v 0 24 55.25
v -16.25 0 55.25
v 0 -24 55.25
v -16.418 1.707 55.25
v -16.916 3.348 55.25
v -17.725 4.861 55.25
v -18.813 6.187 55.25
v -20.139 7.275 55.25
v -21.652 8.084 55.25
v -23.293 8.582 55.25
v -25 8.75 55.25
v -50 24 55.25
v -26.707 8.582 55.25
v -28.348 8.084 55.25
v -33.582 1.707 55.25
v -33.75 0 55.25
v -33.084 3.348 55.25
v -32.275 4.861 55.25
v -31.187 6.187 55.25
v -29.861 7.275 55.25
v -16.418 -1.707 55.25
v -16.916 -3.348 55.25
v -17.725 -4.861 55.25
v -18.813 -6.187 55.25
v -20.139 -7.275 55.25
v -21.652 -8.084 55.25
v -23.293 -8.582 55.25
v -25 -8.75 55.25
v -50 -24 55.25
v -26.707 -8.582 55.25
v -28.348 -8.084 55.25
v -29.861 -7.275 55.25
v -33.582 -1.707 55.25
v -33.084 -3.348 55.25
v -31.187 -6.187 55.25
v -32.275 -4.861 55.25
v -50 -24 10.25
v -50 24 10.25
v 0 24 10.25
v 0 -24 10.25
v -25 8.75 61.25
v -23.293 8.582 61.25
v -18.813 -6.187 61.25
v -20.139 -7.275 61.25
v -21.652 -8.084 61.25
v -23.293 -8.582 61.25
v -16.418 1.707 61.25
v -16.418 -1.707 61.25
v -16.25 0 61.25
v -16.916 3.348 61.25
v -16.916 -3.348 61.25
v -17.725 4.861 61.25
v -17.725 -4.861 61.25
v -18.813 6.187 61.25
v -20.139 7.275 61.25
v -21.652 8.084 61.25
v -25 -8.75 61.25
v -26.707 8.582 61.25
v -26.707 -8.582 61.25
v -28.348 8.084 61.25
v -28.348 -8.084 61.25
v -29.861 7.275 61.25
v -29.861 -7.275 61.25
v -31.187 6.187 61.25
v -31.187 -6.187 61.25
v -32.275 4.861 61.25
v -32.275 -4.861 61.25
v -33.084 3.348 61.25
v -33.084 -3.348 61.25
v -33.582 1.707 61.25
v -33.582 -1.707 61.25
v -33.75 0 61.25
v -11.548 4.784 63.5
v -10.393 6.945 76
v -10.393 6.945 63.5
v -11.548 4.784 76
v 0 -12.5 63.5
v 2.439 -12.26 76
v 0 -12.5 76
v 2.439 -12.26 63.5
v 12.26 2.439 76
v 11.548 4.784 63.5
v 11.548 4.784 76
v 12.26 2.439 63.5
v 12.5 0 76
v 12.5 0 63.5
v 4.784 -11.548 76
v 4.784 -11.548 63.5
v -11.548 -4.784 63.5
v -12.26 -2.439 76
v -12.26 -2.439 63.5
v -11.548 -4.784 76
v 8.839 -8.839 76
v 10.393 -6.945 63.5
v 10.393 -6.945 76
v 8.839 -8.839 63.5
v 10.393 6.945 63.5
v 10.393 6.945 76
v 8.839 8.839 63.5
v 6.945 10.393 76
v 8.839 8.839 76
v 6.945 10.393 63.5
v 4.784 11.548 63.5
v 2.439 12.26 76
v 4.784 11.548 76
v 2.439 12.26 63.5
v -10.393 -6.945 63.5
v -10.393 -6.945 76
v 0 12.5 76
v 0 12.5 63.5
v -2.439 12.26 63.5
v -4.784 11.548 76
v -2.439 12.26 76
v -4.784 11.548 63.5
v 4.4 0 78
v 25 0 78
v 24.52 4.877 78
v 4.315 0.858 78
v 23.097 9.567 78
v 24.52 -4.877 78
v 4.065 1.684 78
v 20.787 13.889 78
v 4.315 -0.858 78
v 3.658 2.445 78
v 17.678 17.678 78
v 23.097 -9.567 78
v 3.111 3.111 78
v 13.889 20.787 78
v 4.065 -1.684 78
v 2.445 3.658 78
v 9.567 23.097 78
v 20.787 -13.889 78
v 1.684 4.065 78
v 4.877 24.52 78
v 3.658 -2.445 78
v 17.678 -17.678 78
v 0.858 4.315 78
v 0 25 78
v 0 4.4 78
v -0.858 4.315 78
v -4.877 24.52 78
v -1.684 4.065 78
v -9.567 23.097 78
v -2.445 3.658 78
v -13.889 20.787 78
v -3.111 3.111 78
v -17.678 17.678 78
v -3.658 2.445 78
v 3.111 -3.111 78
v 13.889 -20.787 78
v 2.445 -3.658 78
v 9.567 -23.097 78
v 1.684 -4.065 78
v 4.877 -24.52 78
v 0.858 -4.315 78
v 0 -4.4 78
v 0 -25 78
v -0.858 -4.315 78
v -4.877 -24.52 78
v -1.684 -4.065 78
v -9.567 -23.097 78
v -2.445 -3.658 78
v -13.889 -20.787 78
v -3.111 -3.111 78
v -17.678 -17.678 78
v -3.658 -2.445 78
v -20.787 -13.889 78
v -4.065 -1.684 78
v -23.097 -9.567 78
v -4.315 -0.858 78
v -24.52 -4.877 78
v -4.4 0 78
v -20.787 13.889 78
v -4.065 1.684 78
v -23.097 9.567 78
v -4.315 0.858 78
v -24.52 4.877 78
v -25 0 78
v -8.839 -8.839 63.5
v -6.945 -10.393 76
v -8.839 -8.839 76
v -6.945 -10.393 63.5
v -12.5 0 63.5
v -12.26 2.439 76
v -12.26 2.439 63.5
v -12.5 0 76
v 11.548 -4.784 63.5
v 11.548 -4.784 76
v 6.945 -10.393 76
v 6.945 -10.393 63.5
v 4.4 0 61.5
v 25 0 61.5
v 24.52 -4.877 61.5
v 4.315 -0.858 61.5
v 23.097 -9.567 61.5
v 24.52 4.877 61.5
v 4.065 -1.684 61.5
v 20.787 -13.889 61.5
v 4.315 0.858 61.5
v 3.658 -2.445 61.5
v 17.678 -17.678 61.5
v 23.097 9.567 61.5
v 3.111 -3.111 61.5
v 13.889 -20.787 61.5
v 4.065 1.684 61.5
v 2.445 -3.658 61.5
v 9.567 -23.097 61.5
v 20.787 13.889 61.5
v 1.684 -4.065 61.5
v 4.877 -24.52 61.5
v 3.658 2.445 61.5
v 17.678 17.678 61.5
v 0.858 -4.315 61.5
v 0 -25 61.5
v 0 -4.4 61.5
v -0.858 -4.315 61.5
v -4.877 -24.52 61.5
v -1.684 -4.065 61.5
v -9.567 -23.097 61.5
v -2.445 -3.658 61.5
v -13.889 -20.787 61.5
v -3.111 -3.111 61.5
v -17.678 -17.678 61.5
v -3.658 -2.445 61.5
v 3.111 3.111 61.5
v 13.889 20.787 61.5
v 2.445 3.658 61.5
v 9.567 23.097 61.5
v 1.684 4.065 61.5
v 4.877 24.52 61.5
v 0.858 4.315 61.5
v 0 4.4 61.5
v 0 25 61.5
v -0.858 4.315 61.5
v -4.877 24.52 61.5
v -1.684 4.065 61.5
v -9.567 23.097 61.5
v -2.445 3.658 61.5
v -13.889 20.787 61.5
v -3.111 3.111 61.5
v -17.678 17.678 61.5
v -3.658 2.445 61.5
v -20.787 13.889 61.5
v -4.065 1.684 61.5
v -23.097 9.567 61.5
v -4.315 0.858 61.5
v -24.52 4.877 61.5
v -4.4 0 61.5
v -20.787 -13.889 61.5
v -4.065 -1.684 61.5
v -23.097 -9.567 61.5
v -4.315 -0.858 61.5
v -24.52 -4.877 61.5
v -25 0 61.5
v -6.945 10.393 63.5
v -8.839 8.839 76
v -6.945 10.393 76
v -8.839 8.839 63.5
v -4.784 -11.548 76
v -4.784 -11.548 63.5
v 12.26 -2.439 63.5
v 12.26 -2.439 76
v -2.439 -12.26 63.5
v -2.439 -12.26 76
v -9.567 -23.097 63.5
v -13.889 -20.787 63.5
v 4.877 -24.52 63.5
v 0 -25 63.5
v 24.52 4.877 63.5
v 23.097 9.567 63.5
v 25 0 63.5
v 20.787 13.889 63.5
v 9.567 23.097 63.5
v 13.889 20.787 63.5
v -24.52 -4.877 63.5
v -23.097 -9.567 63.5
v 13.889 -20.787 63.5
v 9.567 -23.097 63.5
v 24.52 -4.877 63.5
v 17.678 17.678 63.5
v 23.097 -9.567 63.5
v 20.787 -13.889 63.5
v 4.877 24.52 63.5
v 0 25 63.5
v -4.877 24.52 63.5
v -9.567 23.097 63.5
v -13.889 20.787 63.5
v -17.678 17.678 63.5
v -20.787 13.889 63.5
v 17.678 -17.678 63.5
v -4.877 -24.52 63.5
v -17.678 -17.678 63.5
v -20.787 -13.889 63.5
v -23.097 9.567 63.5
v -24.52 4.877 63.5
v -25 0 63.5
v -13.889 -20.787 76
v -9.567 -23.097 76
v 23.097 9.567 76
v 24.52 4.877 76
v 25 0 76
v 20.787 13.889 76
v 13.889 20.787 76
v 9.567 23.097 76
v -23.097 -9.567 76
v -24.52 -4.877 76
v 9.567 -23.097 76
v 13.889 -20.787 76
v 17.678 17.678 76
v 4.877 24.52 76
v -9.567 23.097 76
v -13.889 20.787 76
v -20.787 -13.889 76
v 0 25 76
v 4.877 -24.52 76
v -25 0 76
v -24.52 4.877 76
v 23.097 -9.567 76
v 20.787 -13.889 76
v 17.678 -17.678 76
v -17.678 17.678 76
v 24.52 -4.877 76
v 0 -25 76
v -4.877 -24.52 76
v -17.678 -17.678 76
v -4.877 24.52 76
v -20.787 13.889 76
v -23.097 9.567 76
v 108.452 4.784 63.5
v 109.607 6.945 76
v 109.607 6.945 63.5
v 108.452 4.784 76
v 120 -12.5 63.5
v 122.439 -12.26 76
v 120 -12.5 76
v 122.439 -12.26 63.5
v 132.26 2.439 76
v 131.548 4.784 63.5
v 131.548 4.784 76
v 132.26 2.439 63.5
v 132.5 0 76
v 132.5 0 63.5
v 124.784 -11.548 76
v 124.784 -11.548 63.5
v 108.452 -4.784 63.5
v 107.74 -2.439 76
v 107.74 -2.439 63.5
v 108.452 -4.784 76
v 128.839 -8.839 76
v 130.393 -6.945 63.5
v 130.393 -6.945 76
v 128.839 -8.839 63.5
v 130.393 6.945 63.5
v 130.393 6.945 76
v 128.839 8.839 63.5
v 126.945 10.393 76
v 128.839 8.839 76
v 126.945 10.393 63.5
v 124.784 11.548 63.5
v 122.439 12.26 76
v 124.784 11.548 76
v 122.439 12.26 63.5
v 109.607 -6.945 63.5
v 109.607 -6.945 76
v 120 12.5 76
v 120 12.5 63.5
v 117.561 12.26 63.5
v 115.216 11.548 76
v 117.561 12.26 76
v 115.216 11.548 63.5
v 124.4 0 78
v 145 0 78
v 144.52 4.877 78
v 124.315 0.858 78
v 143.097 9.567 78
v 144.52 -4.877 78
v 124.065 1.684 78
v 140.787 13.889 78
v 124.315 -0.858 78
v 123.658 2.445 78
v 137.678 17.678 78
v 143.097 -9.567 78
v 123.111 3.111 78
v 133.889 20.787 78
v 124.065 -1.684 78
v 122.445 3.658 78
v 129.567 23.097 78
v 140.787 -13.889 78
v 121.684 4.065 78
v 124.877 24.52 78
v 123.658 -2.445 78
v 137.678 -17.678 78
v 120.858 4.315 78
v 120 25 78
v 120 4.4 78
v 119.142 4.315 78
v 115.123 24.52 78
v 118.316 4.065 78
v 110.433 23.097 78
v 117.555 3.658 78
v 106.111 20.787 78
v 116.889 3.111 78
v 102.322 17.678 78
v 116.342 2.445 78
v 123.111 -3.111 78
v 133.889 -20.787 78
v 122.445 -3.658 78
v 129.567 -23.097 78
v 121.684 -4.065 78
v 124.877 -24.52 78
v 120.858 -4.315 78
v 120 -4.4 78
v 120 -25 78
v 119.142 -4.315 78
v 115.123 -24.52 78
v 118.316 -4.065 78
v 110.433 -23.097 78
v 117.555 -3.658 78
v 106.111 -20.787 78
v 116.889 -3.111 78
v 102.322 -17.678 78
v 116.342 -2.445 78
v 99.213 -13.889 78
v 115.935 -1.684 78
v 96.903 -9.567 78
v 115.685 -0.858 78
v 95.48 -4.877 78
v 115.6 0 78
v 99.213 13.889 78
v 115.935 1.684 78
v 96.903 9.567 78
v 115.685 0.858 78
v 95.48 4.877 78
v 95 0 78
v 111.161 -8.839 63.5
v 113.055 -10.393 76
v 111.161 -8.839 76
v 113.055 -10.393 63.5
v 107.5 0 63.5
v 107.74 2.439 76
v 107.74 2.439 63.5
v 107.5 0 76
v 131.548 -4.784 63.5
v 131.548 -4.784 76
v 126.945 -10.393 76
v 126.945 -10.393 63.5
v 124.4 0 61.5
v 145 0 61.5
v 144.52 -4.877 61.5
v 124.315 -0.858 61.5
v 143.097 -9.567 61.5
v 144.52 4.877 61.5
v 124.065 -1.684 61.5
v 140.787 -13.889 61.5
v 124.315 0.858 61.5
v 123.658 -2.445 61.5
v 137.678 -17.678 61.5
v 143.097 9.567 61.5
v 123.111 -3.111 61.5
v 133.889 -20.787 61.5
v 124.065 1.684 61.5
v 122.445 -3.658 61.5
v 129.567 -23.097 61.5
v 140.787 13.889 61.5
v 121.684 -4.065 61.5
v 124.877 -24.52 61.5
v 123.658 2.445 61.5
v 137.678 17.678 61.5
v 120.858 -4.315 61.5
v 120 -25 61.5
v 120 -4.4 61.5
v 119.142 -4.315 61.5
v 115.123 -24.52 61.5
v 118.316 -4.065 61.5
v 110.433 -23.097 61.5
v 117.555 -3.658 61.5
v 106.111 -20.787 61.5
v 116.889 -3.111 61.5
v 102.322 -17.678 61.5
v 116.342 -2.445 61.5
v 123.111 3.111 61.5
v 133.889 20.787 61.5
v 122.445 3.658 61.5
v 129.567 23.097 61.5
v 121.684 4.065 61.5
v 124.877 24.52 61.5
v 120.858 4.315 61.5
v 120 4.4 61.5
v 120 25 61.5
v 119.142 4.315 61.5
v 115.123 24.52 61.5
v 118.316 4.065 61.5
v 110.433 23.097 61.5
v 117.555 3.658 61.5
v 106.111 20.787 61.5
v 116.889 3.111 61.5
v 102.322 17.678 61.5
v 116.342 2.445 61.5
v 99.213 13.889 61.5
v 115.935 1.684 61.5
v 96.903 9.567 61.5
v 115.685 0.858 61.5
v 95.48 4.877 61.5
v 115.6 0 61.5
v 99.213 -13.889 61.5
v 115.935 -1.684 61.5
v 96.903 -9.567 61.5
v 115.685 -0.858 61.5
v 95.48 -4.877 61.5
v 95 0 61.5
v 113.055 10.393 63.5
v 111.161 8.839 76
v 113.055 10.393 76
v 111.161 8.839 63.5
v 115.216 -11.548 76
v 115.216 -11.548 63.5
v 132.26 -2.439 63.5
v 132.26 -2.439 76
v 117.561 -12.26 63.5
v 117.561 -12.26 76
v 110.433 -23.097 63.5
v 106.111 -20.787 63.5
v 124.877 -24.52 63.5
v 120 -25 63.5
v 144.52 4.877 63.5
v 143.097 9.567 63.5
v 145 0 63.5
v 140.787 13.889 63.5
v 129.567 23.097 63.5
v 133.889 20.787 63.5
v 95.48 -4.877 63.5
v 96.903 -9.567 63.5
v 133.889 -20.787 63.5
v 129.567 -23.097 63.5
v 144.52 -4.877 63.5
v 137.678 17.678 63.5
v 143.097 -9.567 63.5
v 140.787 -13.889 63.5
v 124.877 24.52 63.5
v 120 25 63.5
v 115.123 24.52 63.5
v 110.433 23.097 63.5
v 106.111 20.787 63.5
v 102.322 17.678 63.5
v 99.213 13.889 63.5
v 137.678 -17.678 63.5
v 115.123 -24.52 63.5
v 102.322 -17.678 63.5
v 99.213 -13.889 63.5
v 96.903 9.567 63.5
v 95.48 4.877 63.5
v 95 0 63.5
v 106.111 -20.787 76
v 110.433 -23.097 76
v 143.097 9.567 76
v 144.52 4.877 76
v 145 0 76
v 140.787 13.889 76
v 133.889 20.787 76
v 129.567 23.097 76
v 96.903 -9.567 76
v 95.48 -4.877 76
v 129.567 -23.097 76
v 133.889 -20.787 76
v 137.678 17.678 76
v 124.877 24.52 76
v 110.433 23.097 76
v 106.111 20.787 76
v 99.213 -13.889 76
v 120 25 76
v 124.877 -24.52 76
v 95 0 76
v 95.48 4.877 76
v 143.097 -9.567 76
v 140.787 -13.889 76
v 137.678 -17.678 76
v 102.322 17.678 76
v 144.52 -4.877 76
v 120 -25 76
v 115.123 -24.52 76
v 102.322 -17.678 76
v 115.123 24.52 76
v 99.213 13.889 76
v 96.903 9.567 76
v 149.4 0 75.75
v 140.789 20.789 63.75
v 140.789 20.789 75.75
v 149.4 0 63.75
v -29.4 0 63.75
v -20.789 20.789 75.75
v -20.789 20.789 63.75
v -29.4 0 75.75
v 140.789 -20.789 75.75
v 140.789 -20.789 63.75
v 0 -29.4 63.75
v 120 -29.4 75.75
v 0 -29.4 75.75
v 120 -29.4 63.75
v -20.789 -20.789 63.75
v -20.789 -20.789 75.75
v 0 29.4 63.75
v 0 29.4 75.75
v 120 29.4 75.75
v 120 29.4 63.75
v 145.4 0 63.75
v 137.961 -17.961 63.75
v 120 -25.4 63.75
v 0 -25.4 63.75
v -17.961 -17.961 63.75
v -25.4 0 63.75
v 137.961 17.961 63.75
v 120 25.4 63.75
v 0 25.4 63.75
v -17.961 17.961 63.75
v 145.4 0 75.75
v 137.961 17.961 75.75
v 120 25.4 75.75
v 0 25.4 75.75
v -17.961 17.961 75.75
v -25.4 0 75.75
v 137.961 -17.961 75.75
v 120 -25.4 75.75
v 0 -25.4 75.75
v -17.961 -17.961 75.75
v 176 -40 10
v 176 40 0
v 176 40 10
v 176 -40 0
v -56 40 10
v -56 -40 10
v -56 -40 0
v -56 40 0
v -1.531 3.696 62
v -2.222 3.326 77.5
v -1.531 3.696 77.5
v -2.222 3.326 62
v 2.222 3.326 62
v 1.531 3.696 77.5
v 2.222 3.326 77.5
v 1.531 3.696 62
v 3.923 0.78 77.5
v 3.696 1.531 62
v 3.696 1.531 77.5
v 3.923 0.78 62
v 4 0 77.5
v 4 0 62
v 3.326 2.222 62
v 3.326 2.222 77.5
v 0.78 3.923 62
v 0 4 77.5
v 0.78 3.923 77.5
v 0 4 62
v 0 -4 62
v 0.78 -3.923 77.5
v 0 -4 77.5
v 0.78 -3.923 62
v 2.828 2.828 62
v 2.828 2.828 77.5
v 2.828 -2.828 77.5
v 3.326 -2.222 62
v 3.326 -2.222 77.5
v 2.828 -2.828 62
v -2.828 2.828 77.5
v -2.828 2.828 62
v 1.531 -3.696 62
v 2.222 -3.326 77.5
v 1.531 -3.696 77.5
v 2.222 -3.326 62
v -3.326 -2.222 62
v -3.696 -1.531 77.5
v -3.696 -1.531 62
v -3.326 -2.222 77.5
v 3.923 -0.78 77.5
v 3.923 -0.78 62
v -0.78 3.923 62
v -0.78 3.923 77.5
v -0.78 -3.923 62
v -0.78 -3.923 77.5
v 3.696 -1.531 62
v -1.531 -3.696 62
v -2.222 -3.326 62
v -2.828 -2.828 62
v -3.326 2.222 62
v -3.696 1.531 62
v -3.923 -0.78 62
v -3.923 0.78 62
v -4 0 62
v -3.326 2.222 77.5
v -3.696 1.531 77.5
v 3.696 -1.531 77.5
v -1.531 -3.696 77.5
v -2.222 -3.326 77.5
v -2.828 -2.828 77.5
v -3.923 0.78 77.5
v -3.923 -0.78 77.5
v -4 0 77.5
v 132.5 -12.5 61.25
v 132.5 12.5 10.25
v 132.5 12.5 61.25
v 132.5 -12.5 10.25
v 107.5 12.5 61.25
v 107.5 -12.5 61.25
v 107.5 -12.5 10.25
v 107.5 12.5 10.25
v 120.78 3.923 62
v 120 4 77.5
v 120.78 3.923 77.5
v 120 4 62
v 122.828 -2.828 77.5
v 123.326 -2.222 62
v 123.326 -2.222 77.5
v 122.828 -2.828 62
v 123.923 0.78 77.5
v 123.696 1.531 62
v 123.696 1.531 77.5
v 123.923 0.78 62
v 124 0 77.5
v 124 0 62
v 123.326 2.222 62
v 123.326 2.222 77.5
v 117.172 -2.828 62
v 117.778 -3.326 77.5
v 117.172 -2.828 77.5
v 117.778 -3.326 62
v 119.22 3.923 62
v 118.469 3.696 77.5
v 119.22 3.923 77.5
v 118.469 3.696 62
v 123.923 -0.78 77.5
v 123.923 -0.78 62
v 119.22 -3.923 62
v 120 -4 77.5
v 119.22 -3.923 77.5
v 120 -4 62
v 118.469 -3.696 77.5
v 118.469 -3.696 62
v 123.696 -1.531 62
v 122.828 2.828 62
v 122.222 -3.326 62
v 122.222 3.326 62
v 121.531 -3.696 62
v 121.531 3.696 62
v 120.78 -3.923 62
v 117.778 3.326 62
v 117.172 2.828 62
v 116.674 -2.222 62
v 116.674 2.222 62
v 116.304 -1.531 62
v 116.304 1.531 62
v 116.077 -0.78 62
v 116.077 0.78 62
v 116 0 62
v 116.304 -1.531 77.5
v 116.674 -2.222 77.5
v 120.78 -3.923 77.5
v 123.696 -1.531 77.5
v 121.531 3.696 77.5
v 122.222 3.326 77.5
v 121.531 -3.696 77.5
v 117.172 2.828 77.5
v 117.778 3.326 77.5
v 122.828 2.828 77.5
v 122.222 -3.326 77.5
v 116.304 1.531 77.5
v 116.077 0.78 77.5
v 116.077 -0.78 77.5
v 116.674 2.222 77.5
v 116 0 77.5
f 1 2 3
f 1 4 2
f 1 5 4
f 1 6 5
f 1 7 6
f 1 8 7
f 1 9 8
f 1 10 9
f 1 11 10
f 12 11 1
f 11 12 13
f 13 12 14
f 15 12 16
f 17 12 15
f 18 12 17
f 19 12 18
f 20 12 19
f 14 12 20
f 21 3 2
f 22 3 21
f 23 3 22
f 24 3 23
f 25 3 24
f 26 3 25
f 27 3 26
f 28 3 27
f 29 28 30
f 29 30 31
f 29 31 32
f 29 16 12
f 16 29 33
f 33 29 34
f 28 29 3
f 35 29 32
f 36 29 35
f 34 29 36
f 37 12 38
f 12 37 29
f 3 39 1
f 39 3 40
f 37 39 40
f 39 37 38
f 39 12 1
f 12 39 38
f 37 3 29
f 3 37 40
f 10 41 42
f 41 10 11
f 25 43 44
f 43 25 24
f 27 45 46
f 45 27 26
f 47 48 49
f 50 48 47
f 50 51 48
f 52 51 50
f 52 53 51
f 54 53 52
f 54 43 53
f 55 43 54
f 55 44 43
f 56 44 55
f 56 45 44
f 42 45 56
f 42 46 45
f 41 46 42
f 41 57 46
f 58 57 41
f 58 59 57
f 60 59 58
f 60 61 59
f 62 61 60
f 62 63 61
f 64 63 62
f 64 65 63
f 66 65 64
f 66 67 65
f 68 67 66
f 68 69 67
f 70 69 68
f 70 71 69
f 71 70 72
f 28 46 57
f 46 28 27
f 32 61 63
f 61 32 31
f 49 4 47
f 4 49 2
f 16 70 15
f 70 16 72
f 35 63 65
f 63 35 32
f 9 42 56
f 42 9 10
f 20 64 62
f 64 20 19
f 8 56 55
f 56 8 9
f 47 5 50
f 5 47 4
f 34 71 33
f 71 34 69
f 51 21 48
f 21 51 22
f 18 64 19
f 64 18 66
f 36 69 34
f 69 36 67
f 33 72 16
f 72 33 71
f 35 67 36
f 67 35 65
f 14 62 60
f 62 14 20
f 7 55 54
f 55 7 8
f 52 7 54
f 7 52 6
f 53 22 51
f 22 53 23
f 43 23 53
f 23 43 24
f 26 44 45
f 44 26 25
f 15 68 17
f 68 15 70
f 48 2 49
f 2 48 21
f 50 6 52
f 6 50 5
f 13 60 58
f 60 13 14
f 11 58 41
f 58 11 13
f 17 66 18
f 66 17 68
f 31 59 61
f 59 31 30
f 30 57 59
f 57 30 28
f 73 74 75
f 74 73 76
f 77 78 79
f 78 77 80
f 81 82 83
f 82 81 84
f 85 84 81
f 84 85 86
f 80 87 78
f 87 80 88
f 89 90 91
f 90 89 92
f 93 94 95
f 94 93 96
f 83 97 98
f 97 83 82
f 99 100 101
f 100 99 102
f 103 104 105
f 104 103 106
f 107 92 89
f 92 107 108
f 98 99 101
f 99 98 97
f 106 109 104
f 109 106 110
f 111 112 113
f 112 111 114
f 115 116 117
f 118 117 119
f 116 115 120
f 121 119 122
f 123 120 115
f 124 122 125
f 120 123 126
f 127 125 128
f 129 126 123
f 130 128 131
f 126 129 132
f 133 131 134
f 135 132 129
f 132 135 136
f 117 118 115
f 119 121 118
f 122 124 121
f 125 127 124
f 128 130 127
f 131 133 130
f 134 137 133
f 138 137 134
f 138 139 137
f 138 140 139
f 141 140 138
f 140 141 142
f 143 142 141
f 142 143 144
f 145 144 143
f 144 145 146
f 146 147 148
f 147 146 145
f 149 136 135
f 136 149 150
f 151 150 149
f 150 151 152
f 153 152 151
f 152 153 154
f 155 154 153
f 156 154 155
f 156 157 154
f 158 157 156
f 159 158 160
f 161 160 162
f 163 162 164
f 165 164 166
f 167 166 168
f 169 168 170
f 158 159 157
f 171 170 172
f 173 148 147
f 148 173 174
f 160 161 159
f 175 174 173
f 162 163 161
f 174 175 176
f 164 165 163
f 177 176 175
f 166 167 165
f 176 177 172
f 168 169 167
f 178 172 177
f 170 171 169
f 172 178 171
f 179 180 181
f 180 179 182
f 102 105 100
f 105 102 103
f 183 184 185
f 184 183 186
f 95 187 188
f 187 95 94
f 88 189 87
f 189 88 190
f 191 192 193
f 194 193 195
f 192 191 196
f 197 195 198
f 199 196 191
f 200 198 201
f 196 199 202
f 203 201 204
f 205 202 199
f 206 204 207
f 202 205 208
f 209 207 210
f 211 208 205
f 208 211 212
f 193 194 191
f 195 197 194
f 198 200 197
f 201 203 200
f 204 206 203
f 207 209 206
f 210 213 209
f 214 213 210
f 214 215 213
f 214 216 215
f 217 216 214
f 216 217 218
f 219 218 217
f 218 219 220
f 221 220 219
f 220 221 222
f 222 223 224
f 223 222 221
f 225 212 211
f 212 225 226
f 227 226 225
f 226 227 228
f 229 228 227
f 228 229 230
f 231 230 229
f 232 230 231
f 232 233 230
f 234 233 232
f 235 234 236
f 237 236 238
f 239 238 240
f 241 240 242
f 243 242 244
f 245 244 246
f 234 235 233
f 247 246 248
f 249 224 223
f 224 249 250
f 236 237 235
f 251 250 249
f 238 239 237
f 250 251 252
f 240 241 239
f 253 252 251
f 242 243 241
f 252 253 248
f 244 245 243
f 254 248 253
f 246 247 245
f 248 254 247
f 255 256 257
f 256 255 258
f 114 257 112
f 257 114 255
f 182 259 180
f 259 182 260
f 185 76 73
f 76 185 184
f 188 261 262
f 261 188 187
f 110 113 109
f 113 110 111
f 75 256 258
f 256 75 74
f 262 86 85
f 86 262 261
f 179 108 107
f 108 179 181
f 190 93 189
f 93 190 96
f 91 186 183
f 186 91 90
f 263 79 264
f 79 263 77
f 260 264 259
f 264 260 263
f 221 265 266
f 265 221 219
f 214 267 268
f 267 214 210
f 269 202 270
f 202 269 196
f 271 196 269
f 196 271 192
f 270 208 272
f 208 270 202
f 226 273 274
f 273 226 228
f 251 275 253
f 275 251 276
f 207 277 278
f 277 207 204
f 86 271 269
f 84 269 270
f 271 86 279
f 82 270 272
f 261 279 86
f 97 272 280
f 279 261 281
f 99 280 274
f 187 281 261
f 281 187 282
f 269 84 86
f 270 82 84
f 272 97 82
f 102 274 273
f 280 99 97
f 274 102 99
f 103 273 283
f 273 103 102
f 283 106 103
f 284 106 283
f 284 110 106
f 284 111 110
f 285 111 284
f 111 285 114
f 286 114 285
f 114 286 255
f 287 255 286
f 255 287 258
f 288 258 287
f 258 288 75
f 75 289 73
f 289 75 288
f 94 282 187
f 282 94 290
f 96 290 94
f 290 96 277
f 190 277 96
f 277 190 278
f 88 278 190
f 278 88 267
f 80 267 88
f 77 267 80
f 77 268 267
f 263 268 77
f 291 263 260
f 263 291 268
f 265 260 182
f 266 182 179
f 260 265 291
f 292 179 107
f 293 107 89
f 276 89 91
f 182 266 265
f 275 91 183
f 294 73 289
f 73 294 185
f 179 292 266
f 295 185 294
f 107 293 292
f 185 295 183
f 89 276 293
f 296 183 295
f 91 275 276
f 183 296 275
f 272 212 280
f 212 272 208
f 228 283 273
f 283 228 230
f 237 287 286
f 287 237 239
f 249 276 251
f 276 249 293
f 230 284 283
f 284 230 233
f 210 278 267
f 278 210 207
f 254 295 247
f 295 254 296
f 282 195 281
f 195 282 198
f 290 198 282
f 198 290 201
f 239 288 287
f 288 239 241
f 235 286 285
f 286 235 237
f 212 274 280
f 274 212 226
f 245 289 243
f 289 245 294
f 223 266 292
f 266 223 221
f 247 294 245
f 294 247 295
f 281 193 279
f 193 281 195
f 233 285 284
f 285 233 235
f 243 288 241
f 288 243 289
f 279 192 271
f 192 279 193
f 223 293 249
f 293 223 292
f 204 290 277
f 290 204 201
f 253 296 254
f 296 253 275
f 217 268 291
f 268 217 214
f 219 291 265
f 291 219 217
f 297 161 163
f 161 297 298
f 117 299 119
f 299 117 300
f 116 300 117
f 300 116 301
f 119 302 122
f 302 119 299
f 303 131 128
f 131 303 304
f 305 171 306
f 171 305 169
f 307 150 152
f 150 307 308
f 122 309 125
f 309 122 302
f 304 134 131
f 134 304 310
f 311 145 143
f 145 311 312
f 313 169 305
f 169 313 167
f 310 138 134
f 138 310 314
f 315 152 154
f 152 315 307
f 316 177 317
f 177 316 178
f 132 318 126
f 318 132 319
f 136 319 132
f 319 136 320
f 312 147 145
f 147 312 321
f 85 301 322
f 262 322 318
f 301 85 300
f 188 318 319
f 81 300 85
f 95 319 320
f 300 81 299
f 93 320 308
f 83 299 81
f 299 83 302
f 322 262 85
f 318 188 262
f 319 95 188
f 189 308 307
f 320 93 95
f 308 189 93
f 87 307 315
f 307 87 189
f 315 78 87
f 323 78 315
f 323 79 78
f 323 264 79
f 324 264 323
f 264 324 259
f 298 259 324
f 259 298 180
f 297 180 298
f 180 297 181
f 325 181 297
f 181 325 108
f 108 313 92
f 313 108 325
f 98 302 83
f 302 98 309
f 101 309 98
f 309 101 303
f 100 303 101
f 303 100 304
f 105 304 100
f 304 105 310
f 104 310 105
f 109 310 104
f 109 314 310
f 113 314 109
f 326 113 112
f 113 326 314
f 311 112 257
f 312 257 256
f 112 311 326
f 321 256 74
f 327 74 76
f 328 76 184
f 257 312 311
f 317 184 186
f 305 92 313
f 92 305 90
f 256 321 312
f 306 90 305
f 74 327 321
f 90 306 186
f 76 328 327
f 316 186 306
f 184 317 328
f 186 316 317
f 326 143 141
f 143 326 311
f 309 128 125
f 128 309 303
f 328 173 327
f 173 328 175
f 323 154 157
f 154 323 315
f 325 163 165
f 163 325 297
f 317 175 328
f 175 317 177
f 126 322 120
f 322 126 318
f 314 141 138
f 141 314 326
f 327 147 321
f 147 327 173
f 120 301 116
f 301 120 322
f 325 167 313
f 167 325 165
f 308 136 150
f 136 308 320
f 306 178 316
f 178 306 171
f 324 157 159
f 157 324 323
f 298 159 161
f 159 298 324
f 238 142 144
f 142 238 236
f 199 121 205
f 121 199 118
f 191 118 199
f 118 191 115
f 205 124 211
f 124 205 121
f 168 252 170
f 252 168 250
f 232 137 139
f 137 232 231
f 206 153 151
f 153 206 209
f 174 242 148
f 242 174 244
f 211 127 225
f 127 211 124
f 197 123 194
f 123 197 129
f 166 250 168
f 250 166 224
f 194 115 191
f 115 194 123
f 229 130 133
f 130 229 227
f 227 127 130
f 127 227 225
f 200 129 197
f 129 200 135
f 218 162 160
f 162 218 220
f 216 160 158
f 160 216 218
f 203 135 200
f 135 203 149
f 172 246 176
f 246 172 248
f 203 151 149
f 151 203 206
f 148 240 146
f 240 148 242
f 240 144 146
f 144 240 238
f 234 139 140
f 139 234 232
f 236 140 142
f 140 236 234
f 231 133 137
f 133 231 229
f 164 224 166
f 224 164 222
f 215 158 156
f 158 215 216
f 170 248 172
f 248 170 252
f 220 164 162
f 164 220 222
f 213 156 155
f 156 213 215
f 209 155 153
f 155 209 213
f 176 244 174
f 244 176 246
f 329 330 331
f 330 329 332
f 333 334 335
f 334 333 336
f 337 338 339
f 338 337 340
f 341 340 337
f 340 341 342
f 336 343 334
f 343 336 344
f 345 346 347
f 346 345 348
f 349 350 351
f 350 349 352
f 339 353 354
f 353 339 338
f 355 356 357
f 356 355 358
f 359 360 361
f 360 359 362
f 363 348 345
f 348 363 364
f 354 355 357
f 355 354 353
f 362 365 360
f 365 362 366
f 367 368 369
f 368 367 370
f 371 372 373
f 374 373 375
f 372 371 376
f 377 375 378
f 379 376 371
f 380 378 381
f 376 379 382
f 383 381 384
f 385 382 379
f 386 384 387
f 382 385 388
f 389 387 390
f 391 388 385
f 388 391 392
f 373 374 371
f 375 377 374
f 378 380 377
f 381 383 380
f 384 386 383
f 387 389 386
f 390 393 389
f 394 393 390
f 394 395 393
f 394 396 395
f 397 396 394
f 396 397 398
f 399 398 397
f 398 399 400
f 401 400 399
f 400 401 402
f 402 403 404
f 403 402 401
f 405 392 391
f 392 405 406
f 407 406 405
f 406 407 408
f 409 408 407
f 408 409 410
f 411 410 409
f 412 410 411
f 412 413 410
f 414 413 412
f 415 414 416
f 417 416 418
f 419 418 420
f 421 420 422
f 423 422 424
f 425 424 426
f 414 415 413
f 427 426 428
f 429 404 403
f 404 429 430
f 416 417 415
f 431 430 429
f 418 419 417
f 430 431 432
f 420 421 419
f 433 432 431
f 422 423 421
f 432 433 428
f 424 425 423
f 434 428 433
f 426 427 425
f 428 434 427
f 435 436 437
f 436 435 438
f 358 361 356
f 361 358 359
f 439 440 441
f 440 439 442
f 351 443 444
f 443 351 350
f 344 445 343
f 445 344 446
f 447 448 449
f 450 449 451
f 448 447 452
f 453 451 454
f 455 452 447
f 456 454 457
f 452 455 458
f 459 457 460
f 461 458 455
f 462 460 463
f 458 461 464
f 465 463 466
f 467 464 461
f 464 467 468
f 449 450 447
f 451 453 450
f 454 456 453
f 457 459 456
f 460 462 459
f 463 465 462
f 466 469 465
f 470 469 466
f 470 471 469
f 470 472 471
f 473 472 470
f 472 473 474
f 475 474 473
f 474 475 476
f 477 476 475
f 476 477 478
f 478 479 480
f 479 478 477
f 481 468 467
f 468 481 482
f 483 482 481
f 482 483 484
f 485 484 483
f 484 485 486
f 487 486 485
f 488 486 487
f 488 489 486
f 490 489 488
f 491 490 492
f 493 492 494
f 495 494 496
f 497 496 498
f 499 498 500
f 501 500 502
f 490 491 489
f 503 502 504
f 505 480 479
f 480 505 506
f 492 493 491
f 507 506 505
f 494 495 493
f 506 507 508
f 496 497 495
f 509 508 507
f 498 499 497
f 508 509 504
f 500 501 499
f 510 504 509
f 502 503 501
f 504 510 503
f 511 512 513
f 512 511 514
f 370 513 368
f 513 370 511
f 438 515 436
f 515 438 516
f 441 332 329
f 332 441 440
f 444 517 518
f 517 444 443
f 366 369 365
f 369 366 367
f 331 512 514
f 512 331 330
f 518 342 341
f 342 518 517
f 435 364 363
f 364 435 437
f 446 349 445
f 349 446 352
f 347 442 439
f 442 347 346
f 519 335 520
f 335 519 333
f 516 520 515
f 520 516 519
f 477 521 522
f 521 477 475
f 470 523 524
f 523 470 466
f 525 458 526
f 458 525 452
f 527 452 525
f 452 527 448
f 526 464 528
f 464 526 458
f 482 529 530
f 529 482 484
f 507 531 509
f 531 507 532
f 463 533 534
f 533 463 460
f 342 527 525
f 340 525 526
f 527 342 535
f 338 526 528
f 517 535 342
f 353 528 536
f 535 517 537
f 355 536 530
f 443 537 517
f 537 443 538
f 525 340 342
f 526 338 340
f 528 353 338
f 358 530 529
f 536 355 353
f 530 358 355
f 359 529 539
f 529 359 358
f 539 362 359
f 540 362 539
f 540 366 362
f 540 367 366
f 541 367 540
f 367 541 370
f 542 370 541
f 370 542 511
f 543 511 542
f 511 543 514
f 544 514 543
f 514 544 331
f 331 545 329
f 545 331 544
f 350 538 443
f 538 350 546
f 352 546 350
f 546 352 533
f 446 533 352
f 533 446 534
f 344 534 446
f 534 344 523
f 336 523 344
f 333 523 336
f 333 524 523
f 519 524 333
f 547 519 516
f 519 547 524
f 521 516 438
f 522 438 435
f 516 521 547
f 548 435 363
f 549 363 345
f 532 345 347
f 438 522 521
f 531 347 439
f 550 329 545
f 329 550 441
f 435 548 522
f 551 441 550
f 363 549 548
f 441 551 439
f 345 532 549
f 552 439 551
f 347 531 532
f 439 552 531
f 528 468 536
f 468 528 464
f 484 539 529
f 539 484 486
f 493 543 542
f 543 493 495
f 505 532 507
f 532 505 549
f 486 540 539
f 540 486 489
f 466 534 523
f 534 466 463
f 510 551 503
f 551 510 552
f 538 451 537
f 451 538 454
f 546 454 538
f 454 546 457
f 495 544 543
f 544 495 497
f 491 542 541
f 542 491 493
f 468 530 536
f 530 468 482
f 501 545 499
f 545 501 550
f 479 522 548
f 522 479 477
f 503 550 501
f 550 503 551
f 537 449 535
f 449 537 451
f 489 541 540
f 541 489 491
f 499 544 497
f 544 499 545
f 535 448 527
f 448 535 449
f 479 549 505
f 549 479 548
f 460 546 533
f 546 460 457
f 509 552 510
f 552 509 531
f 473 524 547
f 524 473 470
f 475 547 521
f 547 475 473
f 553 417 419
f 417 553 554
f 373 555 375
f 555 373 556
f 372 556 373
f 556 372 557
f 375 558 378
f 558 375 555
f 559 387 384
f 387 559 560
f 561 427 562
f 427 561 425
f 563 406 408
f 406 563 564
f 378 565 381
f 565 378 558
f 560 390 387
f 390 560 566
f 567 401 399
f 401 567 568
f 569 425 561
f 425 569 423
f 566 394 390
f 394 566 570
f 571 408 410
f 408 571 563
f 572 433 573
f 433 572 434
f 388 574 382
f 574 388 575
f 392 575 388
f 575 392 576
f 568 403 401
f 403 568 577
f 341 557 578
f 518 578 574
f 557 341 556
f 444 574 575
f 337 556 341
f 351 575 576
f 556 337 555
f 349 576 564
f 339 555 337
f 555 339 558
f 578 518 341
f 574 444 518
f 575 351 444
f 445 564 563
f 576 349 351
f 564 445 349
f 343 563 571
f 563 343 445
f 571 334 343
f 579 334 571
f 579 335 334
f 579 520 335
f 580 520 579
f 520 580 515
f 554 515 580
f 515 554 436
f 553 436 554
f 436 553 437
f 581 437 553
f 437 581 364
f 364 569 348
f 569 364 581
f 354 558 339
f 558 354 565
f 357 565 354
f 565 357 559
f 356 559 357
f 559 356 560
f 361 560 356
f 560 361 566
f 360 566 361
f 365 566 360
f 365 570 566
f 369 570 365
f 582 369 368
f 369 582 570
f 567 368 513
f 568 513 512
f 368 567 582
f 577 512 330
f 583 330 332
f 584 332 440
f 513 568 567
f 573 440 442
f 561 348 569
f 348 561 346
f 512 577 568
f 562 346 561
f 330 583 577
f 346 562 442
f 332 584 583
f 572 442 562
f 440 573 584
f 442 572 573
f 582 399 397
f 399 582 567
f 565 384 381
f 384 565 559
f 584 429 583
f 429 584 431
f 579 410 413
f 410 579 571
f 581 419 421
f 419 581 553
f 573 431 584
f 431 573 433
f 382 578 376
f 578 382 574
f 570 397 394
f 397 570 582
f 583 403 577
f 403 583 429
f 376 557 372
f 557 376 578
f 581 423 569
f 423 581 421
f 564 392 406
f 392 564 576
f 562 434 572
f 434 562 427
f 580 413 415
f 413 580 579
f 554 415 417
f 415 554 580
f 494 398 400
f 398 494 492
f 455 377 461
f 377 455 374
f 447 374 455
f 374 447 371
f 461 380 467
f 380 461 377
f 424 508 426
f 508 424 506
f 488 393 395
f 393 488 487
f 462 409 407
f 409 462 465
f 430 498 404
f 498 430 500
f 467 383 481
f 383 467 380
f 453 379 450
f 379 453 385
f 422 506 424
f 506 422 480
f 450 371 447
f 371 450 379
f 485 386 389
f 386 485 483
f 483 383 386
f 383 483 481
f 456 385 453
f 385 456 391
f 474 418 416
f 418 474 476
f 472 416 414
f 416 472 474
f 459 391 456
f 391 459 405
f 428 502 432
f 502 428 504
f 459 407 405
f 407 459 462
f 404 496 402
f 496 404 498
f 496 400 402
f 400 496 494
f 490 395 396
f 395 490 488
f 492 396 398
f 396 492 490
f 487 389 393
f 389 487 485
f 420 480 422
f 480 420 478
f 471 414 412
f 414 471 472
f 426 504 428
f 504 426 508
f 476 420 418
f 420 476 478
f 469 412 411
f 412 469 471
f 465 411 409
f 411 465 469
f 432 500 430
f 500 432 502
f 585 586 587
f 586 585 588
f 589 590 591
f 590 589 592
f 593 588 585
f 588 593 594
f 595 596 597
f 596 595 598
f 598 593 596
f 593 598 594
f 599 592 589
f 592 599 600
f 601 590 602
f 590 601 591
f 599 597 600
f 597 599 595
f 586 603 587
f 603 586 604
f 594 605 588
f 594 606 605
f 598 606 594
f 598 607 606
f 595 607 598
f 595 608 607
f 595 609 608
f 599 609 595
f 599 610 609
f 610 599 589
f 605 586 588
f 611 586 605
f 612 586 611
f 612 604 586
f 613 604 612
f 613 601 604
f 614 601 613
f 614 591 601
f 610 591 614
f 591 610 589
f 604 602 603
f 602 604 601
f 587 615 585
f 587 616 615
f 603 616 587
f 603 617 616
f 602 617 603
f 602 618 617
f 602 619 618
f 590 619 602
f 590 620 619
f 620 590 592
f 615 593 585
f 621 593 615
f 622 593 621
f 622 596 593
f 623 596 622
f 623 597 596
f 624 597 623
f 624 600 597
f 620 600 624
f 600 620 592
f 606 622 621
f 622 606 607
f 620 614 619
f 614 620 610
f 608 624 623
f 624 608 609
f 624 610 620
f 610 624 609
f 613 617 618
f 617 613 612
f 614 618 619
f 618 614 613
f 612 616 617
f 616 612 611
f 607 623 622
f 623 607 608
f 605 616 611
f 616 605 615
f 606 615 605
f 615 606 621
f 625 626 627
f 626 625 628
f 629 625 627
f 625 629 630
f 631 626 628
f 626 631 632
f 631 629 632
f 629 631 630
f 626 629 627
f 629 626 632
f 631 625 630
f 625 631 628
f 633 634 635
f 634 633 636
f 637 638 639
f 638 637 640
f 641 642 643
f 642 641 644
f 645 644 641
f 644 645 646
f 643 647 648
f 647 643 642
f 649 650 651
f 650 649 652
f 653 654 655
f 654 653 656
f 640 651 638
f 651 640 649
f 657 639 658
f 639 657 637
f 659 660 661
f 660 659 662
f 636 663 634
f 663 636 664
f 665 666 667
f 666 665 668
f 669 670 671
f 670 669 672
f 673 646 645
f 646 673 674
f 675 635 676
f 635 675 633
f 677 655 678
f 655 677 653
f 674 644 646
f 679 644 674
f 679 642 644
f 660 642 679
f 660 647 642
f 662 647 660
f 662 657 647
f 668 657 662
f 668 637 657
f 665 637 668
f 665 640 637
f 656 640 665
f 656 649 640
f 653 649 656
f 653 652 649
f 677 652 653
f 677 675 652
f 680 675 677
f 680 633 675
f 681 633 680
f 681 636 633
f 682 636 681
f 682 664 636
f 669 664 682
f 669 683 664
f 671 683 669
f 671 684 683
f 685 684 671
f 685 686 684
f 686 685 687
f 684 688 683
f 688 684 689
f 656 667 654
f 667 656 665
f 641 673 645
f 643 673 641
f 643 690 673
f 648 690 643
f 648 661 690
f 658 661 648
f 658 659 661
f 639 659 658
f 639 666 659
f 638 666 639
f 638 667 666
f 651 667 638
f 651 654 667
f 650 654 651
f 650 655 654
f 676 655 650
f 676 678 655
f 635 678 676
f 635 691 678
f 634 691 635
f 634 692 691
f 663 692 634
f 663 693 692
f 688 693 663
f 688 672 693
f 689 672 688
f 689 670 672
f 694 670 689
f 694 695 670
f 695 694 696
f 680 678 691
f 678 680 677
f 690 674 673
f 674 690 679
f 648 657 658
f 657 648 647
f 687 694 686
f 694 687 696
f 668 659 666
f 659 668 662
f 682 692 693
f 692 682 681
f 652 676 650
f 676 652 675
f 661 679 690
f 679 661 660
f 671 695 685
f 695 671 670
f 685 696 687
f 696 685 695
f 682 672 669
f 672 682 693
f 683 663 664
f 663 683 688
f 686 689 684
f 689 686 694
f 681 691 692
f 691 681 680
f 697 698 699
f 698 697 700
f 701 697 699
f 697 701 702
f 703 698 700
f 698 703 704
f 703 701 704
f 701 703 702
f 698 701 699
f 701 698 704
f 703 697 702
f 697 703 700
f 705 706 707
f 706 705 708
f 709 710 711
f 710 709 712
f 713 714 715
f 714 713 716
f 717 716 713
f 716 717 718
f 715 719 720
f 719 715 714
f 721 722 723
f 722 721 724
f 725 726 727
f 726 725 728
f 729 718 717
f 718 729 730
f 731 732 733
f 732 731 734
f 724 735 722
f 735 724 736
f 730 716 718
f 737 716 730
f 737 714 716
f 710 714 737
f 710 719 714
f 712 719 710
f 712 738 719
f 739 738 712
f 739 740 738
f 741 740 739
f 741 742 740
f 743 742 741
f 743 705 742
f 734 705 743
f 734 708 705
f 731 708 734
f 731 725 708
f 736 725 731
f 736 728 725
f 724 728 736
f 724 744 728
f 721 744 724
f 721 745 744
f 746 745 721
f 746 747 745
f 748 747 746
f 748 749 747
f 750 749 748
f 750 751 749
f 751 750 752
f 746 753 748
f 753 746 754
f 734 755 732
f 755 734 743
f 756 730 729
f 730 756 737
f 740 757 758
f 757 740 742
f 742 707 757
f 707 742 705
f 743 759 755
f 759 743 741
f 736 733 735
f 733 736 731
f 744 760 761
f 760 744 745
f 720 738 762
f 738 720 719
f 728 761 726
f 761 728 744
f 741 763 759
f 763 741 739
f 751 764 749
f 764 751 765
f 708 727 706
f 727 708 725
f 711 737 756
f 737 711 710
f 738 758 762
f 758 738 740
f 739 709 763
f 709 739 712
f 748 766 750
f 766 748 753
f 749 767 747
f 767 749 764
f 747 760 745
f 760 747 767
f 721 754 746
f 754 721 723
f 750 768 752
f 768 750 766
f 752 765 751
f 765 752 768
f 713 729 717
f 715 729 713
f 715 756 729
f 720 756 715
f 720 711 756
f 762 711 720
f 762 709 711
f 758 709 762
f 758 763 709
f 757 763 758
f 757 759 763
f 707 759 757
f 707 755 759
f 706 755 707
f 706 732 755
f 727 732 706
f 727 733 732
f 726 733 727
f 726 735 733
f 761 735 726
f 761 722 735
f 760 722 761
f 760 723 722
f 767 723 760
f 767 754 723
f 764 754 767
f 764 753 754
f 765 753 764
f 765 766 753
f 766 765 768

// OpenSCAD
$fn = 32;

// ------------------------------------------------------------------------
// Motor belt drive: span 120 mm, pulleys d50, belt 12 mm wide
// Every part is its own module, assembly() places every instance.
// ------------------------------------------------------------------------

// --- part 1 ---
module base_plate() {
  difference() {
    translate([-116, -40, 0]) cube([232, 80, 10]);
  }
}

// --- part 2 ---
module motor() {
  union() {
    translate([-22.5, -24, 0]) cube([45, 48, 50]);
    translate([25.5, 0, 25]) rotate([0, 90, 0]) cylinder(h = 6, d = 17.5, center = true);
  }
}

// --- part 3 ---
module drive_shaft() {
  translate([0, 0, -7.75]) cylinder(h = 15.5, d = 8);
}

// --- part 4 ---
module pulley_drive() {
  difference() {
    union() {
      cylinder(h = 16.5, d = 25);
      cylinder(h = 2, d = 50);
      translate([0, 0, 14.5]) cylinder(h = 2, d = 50);
    }
    translate([0, 0, -1]) cylinder(h = 18.5, d = 8.8);
  }
}

// --- part 5 ---
module idler_post() {
  translate([-12.5, -12.5, 0]) cube([25, 25, 51]);
}

// --- part 6 ---
module driven_shaft() {
  translate([0, 0, -7.75]) cylinder(h = 15.5, d = 8);
}

// --- part 7 ---
module pulley_driven() {
  difference() {
    union() {
      cylinder(h = 16.5, d = 25);
      cylinder(h = 2, d = 50);
      translate([0, 0, 14.5]) cylinder(h = 2, d = 50);
    }
    translate([0, 0, -1]) cylinder(h = 18.5, d = 8.8);
  }
}

// --- part 8 ---
module drive_belt() {
  difference() {
    linear_extrude(height = 12) polygon(points = concat([for (a = [90 : 45 : 270]) [29.4 * cos(a), 29.4 * sin(a)]], [for (a = [270 : 45 : 450]) [120 + 29.4 * cos(a), 29.4 * sin(a)]]));
    translate([0, 0, -1]) linear_extrude(height = 14) polygon(points = concat([for (a = [90 : 45 : 270]) [25.4 * cos(a), 25.4 * sin(a)]], [for (a = [270 : 45 : 450]) [120 + 25.4 * cos(a), 25.4 * sin(a)]]));
  }
}

// --- assembly ---
module assembly() {
  color([0.80, 0.24, 0.20]) translate([60, 0, 0]) rotate([0, 0, 0]) base_plate();
  color([0.20, 0.45, 0.75]) translate([0, 0, 32.75]) rotate([0, 270, 0]) motor();
  color([0.25, 0.62, 0.32]) translate([0, 0, 69.75]) rotate([0, 0, 0]) drive_shaft();
  color([0.92, 0.70, 0.18]) translate([0, 0, 61.5]) rotate([0, 0, 0]) pulley_drive();
  color([0.58, 0.35, 0.70]) translate([120, 0, 10.25]) rotate([0, 0, 0]) idler_post();
  color([0.16, 0.66, 0.66]) translate([120, 0, 69.75]) rotate([0, 0, 0]) driven_shaft();
  color([0.85, 0.48, 0.18]) translate([120, 0, 61.5]) rotate([0, 0, 0]) pulley_driven();
  color([0.55, 0.60, 0.65]) translate([0, 0, 63.75]) rotate([0, 0, 0]) drive_belt();
}

assembly();
